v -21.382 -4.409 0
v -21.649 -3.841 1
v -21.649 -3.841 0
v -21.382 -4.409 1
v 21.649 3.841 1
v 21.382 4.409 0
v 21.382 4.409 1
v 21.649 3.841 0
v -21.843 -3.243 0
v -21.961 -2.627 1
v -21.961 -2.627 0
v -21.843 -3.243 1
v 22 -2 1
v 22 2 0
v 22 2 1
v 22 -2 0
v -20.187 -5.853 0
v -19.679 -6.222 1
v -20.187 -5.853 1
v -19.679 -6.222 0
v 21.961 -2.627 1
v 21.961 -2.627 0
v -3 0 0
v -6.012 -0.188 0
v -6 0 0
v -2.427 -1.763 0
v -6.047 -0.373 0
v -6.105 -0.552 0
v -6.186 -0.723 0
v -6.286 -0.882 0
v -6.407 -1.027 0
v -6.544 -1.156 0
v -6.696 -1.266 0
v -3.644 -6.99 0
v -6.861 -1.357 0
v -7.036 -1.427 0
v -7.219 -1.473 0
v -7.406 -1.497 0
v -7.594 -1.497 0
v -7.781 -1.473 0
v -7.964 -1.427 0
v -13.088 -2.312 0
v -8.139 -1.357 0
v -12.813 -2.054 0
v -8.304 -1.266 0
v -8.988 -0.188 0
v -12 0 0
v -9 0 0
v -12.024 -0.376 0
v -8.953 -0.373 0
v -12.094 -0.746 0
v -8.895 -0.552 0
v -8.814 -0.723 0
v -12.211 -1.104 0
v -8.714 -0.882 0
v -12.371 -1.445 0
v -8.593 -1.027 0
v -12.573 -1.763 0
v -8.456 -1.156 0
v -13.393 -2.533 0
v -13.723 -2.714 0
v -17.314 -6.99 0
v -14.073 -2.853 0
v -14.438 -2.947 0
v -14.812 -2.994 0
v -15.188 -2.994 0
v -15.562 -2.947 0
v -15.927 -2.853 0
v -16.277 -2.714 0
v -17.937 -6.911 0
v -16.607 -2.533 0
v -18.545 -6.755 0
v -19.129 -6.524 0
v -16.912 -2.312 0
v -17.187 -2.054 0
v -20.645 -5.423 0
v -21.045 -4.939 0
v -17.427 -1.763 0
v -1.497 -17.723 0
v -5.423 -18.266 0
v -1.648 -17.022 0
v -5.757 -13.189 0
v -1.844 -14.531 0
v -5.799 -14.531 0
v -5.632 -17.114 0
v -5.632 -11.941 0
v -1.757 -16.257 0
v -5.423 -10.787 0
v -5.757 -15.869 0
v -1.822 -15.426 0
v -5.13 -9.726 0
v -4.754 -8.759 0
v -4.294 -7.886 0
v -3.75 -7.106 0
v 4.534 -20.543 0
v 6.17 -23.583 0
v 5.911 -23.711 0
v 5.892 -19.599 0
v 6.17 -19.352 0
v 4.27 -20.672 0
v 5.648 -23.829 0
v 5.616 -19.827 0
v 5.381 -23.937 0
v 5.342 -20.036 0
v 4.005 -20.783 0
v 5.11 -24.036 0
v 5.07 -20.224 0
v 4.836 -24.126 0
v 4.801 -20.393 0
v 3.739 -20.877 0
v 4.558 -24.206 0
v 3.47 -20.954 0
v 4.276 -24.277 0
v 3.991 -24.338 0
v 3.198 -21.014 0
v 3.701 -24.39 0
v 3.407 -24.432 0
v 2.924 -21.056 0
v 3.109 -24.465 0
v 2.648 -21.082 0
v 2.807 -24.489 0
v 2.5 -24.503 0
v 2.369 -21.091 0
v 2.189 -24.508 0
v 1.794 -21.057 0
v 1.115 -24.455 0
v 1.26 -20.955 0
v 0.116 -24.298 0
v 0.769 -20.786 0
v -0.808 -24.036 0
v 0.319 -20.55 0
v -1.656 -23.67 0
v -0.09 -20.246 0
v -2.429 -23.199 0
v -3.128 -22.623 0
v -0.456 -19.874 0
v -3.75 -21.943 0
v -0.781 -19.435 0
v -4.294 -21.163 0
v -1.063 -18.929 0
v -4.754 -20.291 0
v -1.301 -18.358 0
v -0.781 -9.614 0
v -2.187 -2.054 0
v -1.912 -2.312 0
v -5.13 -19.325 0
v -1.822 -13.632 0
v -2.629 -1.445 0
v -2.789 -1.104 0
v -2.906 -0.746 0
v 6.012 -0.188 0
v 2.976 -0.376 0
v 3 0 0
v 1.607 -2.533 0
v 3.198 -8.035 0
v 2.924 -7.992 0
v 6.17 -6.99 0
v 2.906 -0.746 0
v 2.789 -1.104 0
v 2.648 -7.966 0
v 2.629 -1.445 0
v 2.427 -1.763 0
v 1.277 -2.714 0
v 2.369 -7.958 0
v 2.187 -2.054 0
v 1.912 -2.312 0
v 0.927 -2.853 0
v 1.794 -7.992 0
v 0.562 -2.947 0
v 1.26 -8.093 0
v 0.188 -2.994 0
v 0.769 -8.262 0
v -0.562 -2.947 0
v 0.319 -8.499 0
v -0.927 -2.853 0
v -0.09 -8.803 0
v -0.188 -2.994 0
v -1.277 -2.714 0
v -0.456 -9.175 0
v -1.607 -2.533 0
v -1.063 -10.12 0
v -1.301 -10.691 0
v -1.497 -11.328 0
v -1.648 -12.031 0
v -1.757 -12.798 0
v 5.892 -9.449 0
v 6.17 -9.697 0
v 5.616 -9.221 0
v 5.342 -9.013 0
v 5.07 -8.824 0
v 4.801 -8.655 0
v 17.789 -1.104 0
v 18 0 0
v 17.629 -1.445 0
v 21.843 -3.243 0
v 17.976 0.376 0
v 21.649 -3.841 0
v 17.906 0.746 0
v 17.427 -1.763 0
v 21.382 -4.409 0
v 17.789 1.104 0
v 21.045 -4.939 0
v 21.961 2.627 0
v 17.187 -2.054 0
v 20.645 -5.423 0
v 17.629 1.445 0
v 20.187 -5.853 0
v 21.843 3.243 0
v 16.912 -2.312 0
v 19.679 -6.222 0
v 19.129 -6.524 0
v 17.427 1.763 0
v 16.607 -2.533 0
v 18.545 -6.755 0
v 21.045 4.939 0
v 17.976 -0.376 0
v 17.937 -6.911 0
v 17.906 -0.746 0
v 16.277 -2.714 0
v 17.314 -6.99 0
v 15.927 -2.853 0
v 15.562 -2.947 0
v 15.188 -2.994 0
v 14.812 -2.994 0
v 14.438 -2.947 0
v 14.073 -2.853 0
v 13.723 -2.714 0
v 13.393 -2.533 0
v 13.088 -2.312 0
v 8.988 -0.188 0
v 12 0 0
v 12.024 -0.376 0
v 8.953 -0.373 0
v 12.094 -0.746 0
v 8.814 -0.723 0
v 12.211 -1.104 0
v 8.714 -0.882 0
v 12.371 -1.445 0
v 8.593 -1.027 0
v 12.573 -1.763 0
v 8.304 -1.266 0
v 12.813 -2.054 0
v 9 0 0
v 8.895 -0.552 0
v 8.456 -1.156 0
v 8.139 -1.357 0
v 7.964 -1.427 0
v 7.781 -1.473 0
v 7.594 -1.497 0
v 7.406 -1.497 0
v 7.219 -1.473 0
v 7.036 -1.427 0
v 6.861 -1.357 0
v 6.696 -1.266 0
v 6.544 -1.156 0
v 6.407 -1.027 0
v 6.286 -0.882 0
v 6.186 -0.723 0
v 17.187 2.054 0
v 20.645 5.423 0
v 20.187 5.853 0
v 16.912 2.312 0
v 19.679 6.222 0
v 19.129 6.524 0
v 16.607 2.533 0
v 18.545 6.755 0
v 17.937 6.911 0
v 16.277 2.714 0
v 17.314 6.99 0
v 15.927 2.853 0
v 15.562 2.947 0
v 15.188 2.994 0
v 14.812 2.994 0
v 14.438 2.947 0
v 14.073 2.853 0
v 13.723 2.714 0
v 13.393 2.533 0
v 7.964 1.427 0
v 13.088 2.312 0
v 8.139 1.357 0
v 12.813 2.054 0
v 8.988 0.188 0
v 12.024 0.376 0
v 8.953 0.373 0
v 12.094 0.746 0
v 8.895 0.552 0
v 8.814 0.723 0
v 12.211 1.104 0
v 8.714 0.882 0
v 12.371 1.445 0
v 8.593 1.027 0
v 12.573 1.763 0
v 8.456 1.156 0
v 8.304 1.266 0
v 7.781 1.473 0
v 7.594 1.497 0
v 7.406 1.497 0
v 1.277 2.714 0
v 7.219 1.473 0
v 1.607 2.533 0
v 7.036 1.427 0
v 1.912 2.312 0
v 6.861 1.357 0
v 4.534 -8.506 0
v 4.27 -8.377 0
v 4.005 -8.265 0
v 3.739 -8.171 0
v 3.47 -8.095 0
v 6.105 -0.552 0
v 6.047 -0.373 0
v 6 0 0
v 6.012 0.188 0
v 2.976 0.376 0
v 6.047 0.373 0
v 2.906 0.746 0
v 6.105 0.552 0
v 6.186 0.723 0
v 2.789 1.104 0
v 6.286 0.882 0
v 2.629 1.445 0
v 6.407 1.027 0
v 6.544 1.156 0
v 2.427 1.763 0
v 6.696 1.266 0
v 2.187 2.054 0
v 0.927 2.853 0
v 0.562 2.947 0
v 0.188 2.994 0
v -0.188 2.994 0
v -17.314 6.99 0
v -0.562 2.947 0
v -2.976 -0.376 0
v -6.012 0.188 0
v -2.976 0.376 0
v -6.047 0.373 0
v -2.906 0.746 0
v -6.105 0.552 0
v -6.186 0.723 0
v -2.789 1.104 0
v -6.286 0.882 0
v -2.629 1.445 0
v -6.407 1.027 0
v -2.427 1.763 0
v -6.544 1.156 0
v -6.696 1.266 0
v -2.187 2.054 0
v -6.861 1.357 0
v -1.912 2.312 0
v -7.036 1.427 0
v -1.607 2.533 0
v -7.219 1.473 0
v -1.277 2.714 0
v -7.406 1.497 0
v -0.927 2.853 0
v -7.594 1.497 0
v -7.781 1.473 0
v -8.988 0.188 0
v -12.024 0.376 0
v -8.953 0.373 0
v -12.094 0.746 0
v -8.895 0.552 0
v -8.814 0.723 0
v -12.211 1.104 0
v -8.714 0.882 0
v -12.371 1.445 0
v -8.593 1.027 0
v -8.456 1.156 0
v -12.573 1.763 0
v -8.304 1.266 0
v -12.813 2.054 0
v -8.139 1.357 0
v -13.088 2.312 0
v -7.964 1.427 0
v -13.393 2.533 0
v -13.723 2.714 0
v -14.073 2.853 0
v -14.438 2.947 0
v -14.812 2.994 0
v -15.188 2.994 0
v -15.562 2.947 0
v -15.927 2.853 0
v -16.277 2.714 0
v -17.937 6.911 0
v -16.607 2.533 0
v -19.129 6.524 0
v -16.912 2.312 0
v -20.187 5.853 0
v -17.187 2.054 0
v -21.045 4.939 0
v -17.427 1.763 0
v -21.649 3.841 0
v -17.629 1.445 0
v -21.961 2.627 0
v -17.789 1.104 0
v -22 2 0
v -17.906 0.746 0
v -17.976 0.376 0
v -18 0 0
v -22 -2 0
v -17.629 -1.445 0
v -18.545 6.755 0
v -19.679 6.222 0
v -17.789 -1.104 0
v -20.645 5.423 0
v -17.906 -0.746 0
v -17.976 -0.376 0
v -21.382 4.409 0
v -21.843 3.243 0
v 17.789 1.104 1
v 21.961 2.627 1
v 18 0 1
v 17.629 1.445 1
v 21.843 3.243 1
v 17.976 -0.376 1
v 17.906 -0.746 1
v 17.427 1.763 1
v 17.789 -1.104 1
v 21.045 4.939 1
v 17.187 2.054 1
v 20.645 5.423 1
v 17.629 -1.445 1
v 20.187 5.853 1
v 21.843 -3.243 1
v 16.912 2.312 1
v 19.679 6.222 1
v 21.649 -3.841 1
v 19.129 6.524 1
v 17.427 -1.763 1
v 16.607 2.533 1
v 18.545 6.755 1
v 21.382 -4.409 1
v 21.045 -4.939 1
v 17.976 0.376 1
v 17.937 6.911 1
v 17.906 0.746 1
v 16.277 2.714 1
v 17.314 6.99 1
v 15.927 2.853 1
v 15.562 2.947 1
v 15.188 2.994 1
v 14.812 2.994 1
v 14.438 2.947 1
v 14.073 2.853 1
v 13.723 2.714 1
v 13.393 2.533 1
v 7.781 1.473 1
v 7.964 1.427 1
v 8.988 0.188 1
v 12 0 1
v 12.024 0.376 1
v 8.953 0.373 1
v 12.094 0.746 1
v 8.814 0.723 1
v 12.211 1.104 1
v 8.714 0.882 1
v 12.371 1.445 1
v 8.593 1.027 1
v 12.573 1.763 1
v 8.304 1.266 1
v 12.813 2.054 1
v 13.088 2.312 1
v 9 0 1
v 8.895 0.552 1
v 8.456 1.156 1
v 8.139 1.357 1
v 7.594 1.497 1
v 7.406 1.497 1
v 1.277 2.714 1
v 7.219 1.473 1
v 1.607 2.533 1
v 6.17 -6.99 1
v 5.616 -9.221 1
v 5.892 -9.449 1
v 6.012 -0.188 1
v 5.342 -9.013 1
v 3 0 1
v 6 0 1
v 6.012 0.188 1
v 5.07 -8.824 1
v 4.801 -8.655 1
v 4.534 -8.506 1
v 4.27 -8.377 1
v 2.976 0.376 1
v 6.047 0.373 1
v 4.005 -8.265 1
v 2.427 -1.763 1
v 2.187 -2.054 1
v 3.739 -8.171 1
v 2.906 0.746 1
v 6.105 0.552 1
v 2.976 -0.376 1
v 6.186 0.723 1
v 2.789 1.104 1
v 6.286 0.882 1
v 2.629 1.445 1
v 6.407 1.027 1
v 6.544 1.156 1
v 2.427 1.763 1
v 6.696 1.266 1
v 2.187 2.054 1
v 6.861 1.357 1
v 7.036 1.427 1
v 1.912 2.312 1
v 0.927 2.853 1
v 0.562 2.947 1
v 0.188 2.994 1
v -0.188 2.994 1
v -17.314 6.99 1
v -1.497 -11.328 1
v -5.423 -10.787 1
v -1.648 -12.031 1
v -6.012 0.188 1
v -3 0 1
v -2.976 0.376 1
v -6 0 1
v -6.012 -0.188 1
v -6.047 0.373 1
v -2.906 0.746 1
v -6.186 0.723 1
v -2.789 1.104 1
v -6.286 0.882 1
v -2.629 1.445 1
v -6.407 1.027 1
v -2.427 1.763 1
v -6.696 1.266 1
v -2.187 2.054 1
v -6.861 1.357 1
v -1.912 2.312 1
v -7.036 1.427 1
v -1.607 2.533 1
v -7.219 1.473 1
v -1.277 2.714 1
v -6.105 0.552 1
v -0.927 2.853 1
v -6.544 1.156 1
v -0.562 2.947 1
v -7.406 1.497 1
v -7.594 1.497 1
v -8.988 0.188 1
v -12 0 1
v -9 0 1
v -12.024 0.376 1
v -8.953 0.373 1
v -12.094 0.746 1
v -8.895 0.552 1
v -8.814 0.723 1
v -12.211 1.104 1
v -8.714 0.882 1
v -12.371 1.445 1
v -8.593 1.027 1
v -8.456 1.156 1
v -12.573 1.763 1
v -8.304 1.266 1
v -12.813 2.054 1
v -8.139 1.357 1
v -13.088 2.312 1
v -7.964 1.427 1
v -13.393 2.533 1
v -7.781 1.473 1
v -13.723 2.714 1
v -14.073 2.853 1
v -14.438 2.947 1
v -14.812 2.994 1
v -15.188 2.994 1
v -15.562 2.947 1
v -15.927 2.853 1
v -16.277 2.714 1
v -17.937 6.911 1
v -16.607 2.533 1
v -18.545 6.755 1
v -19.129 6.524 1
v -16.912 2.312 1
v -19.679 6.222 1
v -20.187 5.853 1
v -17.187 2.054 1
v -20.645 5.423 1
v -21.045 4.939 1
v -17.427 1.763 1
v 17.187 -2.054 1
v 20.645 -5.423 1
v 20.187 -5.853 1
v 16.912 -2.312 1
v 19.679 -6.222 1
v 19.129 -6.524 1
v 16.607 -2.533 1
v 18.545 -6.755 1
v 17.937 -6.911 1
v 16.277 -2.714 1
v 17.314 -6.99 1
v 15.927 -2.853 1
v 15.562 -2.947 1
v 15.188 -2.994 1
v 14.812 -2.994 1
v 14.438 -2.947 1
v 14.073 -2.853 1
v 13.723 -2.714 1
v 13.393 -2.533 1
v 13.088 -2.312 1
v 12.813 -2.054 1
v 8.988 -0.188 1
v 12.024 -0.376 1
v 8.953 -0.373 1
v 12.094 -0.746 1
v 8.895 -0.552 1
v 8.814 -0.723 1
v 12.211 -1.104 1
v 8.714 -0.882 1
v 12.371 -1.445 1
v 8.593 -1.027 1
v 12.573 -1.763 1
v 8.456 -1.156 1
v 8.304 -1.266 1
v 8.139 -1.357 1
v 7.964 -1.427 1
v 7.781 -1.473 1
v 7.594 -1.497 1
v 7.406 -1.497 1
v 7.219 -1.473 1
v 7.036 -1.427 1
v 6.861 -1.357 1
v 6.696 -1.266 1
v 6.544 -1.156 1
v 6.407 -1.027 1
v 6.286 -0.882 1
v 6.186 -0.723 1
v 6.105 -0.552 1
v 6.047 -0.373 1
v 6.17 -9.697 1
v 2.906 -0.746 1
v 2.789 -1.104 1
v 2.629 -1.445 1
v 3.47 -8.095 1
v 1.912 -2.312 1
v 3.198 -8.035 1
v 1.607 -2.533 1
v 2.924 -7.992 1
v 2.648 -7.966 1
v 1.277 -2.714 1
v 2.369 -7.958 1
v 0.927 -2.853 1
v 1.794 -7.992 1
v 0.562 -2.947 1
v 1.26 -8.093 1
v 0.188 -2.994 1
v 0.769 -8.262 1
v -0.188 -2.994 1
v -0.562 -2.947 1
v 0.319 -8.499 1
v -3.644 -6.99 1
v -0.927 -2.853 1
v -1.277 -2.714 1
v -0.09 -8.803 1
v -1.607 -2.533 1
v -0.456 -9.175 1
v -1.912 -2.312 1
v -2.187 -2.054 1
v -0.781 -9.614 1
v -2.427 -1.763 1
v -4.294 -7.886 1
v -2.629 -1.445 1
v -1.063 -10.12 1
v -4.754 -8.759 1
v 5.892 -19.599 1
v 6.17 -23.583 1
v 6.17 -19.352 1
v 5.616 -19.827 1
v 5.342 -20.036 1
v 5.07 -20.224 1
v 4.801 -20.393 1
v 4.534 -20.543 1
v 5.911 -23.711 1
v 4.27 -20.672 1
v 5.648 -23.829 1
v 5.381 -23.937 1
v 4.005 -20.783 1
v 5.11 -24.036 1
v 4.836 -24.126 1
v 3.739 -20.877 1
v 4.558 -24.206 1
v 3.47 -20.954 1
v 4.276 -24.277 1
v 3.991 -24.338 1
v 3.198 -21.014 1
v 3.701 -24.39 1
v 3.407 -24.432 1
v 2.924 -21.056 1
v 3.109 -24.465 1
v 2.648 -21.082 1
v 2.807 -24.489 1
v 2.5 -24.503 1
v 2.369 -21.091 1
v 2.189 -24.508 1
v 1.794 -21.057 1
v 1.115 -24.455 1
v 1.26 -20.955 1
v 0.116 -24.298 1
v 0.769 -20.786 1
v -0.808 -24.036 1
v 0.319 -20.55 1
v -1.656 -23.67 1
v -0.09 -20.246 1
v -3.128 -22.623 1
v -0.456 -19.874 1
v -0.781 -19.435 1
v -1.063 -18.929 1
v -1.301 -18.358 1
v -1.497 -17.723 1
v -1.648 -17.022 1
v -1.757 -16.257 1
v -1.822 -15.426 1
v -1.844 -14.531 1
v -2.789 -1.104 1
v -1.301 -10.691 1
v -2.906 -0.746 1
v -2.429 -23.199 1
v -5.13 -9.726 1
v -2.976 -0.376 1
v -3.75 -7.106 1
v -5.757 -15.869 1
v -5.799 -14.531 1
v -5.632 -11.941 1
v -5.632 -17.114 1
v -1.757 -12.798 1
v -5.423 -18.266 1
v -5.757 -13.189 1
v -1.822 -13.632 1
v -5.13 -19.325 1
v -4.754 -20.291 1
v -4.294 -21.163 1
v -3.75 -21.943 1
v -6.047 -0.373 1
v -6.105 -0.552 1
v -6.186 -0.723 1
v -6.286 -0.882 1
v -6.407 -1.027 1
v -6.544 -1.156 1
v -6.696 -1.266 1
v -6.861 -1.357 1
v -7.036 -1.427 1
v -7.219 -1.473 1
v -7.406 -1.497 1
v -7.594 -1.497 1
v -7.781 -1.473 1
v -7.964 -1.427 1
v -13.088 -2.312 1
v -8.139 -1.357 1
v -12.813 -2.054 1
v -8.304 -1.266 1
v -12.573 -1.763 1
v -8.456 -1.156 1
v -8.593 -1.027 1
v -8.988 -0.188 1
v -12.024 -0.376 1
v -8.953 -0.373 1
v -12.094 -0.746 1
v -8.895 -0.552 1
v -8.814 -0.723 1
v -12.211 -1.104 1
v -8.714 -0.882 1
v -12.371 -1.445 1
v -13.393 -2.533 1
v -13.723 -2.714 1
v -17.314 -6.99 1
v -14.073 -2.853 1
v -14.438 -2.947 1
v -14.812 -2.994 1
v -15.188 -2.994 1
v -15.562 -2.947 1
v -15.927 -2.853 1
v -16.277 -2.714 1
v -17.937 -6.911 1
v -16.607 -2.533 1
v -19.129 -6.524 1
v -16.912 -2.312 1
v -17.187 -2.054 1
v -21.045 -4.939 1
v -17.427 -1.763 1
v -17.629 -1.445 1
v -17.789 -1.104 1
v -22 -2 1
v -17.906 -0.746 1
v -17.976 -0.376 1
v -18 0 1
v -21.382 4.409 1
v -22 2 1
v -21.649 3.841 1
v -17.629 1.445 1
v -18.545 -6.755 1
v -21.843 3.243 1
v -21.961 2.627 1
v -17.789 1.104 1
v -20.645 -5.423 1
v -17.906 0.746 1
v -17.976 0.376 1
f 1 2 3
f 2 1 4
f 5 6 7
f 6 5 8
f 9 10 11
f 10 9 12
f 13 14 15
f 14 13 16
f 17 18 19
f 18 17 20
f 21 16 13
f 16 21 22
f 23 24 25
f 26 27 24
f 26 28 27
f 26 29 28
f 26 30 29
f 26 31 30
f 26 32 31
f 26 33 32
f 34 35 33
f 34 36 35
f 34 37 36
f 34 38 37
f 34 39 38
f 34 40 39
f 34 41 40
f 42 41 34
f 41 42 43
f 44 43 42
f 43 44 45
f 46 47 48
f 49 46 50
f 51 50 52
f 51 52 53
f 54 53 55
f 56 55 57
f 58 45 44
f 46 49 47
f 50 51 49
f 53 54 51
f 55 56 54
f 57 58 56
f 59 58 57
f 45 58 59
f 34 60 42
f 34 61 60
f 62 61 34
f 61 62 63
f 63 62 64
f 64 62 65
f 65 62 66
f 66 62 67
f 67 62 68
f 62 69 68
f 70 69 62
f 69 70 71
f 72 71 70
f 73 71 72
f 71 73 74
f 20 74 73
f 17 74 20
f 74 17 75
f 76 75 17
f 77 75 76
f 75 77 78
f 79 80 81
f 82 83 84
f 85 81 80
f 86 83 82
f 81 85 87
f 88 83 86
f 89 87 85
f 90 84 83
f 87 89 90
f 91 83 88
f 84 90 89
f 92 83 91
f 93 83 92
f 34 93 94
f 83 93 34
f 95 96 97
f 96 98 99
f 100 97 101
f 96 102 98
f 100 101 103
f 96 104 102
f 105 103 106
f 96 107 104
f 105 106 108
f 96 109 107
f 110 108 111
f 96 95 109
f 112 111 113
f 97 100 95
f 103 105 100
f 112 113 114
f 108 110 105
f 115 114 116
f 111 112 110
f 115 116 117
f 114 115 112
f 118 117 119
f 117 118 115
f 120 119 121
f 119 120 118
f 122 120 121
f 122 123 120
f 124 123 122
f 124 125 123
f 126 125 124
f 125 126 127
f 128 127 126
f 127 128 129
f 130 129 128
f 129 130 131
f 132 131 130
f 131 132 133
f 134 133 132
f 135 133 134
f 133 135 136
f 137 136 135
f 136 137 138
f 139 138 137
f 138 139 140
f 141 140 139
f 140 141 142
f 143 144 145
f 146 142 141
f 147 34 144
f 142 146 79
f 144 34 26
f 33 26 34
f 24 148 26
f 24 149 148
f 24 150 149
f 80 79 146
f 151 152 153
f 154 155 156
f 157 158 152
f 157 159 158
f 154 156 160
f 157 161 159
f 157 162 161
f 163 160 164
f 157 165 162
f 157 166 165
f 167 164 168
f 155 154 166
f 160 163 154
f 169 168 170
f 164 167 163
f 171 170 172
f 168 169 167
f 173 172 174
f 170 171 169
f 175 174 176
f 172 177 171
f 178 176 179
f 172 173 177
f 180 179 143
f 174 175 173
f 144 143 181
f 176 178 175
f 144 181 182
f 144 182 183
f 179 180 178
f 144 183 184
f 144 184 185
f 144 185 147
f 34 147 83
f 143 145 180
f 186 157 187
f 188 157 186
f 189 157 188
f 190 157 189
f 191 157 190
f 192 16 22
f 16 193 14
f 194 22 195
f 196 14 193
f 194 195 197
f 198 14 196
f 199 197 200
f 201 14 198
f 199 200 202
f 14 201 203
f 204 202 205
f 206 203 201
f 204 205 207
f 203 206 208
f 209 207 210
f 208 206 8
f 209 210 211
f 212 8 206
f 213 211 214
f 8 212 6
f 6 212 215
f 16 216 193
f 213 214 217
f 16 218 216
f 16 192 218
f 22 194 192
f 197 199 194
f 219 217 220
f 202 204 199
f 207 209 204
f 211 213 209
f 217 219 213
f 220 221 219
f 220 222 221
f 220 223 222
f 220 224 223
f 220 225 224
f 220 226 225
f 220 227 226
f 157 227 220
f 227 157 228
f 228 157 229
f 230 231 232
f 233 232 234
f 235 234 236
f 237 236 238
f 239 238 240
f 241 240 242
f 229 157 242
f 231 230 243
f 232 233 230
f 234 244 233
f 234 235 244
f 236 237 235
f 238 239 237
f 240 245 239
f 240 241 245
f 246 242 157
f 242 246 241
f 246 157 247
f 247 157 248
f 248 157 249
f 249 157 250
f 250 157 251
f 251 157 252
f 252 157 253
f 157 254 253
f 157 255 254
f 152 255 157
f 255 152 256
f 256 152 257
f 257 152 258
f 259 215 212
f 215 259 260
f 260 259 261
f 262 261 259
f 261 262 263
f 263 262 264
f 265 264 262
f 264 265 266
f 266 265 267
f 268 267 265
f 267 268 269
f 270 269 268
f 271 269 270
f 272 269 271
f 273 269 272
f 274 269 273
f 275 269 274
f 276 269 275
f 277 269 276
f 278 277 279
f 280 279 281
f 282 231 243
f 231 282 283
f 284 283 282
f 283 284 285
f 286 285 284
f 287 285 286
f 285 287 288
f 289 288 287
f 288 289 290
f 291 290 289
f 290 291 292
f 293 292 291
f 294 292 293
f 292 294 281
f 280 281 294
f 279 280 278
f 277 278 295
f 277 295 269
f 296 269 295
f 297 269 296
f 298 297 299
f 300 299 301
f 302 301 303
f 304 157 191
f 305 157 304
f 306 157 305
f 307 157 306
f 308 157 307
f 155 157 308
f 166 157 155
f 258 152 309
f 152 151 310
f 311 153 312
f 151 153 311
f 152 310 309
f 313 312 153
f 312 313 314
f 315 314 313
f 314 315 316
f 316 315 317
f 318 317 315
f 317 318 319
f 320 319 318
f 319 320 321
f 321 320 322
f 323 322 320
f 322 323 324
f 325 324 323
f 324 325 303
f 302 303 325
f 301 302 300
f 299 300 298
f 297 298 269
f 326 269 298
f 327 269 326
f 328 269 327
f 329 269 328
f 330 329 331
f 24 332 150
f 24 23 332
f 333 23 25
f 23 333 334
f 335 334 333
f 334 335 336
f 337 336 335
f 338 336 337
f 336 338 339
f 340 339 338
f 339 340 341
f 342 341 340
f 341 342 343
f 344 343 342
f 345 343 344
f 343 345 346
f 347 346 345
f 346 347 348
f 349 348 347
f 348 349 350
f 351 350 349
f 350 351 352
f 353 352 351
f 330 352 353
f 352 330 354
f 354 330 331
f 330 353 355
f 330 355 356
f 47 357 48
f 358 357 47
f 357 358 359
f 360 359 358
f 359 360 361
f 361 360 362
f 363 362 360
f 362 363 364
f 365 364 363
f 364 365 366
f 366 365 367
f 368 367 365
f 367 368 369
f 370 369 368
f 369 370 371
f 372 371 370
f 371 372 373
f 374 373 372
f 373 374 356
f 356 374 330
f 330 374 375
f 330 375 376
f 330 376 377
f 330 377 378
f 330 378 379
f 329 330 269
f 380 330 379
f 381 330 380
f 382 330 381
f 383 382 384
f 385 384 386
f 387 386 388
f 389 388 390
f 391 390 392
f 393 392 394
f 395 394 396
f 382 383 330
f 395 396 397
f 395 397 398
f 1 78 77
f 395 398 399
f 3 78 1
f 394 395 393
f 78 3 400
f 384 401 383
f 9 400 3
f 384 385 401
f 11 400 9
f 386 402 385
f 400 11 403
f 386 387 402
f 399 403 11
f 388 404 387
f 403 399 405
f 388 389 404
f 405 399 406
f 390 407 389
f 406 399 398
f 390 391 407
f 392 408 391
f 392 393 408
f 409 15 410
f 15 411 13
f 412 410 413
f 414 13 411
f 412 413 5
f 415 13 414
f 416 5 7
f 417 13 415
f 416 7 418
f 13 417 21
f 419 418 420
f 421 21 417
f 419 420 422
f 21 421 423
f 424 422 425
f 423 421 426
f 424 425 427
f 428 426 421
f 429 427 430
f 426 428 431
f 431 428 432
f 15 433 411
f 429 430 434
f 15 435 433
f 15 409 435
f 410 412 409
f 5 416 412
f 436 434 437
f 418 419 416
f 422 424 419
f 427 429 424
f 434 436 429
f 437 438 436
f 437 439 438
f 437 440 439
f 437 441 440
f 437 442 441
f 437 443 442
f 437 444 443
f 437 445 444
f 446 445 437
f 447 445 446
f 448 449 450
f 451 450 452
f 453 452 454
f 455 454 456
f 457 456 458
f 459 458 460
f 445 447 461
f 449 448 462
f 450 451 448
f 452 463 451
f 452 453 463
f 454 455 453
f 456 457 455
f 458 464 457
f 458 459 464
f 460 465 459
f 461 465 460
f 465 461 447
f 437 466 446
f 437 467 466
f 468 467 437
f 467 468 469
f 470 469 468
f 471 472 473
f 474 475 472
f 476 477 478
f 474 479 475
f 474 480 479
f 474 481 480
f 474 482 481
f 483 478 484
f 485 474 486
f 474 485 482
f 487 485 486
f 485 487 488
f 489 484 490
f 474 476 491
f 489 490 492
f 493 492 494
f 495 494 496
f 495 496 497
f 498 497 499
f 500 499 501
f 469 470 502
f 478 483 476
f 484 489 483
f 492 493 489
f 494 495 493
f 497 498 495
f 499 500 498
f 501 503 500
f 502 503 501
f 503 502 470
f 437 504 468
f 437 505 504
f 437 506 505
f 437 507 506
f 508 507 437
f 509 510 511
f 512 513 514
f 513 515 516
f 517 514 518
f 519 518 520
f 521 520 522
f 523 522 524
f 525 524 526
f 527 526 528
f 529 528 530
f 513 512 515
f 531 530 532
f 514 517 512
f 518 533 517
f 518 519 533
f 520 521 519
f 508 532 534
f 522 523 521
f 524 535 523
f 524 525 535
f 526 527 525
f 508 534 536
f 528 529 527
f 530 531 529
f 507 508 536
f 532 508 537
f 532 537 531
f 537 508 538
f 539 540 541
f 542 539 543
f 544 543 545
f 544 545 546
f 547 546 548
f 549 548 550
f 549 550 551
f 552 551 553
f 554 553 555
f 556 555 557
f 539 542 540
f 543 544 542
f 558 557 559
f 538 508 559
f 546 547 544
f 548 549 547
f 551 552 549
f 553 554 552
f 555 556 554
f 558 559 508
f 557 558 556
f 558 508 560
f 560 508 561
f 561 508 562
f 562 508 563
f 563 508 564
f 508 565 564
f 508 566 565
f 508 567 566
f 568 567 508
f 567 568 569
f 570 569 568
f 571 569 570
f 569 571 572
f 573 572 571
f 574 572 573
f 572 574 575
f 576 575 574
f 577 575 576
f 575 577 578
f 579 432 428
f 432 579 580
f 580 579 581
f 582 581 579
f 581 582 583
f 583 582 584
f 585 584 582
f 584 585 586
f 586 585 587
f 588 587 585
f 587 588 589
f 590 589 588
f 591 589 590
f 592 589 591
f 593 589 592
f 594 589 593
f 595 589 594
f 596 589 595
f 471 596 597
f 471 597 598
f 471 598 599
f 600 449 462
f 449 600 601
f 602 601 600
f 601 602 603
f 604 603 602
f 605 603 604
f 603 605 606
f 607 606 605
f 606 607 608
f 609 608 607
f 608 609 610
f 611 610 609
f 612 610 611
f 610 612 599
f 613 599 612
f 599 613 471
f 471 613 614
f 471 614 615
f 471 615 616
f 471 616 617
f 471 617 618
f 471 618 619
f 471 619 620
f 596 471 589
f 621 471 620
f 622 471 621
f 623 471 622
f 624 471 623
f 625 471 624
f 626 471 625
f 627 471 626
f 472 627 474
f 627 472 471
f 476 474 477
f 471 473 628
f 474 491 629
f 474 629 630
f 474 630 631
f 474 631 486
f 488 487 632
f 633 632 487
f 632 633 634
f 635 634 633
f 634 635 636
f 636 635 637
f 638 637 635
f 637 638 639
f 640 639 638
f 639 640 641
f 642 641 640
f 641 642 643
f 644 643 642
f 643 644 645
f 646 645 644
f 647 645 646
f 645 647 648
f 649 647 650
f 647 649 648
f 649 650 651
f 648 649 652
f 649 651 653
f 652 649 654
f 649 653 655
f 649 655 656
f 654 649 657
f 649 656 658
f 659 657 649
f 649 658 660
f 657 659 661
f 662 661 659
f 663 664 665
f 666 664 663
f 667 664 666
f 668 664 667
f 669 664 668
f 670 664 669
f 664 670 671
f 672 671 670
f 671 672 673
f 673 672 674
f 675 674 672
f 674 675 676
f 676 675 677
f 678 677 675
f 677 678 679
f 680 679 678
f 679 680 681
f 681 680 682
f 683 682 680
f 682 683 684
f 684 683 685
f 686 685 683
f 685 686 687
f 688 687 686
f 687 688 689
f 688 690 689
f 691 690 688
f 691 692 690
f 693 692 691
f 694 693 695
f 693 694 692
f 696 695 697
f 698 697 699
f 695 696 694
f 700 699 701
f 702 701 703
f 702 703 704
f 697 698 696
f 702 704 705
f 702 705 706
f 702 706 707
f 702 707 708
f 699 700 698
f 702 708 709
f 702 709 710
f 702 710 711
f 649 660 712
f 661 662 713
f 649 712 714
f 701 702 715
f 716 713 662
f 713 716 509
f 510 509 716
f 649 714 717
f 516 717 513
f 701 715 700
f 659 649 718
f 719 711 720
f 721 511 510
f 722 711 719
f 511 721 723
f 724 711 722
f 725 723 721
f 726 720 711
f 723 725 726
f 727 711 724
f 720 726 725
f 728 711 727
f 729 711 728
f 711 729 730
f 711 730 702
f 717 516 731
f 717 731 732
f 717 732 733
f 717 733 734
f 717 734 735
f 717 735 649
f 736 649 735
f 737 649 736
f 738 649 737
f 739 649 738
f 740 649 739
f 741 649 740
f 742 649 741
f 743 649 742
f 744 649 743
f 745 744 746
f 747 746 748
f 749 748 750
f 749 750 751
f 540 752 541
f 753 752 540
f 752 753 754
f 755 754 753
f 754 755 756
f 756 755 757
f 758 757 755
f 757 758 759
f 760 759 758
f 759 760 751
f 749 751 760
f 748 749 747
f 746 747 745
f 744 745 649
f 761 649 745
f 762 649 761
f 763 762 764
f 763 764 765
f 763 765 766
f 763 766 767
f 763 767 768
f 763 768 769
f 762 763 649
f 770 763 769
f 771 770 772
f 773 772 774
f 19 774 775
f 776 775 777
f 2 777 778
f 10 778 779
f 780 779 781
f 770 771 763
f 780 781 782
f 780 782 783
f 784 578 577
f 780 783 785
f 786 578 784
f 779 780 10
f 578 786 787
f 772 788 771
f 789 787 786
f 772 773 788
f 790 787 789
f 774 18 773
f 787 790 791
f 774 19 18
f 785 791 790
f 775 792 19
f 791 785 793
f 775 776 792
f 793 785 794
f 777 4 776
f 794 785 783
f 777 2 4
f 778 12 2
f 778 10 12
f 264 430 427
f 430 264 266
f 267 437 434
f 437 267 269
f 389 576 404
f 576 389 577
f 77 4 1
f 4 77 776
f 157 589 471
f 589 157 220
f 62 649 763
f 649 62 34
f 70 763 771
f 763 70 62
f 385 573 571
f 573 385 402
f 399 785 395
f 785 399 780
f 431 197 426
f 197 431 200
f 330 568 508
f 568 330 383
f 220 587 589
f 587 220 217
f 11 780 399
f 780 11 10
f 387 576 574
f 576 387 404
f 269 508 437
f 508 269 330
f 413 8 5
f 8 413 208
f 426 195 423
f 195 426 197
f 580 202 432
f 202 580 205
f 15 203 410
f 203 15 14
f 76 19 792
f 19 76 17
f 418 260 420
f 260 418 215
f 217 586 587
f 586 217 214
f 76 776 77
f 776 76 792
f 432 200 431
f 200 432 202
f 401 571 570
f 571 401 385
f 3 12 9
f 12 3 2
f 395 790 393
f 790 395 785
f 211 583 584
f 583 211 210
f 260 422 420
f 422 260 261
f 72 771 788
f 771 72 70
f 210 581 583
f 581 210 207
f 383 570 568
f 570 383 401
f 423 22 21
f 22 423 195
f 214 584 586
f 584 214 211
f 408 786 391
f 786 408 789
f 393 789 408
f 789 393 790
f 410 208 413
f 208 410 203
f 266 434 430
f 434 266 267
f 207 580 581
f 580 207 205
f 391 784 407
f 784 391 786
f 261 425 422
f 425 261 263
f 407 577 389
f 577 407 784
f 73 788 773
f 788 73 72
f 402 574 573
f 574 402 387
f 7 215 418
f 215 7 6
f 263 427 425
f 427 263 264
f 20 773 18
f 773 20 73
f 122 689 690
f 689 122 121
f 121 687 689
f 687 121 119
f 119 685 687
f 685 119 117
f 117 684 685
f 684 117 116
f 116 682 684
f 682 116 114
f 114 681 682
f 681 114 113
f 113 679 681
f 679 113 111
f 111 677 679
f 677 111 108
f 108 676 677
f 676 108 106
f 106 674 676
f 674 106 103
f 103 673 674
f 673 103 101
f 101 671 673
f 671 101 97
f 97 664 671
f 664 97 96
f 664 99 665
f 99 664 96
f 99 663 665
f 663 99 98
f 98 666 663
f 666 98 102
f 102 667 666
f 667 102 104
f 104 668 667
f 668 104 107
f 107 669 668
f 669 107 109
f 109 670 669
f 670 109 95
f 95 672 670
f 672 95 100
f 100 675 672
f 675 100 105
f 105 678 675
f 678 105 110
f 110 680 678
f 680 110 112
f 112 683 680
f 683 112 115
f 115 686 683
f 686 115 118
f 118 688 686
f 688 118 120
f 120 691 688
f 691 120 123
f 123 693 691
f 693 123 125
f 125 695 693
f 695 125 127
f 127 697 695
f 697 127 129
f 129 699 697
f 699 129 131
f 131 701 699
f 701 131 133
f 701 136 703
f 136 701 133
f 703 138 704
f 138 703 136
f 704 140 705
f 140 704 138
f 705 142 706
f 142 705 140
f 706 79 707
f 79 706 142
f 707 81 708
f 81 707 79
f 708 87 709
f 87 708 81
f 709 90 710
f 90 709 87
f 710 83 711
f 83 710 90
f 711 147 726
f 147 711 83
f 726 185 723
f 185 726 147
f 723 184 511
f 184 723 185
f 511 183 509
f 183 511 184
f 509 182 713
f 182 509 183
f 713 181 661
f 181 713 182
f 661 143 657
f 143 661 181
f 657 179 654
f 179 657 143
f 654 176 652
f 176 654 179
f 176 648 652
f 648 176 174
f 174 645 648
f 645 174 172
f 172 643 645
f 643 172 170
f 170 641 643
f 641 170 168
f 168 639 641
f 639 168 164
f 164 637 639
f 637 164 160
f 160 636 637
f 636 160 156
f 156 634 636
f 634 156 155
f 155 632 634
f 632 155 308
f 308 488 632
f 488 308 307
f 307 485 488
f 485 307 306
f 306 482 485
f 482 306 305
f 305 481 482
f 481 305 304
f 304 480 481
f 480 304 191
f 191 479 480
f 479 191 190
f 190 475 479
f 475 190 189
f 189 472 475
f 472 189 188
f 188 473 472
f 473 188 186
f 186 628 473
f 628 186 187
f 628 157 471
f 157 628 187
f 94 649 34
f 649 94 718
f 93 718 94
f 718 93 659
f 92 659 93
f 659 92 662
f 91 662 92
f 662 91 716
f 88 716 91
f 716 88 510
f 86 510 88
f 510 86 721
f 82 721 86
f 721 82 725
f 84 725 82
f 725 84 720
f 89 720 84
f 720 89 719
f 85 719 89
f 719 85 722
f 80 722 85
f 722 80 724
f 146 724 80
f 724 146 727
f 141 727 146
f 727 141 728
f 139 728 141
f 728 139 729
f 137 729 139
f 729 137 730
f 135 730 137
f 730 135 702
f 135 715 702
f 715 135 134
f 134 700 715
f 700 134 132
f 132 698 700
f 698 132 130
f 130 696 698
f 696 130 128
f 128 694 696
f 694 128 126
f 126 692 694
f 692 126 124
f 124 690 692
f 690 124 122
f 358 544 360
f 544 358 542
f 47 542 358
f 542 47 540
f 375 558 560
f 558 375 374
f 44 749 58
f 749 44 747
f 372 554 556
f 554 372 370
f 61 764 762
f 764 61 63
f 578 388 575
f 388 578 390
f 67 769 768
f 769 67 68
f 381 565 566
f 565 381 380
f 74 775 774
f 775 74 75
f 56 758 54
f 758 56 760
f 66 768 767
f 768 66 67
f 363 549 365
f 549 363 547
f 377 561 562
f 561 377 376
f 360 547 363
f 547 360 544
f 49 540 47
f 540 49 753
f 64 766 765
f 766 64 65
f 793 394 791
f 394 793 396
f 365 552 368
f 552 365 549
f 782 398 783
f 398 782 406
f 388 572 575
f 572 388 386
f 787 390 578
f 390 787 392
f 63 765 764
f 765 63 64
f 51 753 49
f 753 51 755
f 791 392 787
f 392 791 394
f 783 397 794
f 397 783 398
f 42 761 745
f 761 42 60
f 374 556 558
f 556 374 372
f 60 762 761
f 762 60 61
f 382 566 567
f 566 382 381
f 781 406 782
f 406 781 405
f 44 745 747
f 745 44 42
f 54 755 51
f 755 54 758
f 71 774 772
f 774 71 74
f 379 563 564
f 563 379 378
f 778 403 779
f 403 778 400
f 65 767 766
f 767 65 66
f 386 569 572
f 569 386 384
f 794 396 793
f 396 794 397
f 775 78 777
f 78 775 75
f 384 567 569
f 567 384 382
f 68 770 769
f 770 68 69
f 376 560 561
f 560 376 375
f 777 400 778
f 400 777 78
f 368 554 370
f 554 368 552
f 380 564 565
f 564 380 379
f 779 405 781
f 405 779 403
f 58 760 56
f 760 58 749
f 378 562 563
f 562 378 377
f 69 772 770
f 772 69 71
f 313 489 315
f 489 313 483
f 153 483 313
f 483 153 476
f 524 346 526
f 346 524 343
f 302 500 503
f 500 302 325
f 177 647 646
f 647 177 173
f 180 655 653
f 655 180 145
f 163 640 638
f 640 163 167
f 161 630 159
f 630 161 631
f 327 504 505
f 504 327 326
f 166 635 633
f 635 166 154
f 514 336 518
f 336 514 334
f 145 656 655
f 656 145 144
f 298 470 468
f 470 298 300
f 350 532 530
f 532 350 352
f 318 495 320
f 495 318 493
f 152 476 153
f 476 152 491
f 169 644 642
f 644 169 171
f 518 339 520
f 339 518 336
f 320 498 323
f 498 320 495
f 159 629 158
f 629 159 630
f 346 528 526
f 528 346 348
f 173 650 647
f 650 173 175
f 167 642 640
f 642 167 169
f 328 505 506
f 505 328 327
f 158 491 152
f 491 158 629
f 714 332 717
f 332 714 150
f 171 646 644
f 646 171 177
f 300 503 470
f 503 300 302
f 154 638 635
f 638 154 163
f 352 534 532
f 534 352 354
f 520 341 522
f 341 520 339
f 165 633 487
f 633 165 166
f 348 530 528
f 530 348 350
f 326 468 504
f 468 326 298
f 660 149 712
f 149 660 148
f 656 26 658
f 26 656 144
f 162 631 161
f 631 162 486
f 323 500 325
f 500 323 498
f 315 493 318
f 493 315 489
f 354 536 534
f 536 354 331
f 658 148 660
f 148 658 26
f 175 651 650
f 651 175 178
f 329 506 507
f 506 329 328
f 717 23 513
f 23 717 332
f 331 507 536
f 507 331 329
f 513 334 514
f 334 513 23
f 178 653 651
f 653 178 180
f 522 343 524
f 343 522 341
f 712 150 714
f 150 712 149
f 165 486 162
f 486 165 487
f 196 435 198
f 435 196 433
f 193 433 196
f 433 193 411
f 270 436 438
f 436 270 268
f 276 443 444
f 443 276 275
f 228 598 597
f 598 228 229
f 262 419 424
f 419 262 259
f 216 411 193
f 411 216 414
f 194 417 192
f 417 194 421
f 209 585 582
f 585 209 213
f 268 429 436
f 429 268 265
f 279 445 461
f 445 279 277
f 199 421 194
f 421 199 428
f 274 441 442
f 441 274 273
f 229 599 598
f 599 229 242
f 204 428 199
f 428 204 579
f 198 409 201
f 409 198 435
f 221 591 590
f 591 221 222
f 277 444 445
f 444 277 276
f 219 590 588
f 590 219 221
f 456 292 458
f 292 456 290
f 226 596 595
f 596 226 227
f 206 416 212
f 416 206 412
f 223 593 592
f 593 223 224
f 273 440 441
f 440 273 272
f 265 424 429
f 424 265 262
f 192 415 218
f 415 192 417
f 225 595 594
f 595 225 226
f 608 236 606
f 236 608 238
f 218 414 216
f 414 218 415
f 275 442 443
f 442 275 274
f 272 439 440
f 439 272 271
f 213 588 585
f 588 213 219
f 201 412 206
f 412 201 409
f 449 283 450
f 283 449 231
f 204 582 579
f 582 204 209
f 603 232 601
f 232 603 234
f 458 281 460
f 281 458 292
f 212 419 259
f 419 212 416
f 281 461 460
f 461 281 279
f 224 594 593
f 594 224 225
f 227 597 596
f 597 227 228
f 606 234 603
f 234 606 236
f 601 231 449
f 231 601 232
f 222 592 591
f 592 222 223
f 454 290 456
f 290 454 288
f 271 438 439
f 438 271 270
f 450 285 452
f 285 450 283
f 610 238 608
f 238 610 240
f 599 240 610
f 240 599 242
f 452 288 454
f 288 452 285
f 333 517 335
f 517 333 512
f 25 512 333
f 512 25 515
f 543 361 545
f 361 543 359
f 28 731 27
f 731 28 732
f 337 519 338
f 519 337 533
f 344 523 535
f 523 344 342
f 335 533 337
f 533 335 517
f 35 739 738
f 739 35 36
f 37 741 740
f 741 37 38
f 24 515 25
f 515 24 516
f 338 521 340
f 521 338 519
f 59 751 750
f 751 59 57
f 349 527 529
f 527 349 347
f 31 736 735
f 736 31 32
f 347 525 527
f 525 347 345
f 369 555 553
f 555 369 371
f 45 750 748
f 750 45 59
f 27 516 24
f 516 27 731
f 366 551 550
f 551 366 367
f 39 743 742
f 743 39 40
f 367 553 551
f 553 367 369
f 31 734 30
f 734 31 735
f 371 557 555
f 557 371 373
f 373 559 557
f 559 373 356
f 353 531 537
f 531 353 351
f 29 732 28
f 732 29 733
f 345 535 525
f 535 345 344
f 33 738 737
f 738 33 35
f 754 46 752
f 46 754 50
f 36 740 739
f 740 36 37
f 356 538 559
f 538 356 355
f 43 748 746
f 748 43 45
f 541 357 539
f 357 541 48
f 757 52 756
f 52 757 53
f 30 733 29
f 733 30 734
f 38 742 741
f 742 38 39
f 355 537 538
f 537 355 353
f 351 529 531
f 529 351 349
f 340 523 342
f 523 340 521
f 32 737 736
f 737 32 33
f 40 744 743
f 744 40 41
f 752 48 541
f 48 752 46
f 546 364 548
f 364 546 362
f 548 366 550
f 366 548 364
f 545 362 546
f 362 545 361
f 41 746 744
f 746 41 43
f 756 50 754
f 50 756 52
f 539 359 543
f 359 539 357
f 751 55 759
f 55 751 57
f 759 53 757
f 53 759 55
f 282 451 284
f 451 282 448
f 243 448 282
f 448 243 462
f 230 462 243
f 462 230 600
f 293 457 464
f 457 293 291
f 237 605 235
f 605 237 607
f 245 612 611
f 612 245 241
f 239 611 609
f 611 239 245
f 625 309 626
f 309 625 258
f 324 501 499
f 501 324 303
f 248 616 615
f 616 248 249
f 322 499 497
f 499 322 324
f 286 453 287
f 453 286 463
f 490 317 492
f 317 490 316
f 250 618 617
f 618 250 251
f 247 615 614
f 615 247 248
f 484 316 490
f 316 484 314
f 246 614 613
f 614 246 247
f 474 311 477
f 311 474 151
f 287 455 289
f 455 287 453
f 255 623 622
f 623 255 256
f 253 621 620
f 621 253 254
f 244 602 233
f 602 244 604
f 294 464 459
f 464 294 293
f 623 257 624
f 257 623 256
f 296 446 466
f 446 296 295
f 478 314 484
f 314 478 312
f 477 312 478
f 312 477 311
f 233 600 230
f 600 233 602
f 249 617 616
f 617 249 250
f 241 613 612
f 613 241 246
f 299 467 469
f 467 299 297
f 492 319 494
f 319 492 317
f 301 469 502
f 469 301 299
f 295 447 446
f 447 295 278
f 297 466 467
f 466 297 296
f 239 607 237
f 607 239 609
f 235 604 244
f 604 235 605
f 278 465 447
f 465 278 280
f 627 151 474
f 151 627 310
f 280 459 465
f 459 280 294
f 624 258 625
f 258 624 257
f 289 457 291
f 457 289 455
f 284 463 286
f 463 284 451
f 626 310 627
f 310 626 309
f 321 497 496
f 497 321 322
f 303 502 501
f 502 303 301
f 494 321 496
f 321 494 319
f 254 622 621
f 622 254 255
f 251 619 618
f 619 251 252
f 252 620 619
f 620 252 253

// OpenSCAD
$fn = 50;


difference() {
	union() {
		hull() {
			translate(v = [-17.0000000000, 2.0000000000, 0]) {
				cylinder(h = 1, r = 5);
			}
			translate(v = [17.0000000000, 2.0000000000, 0]) {
				cylinder(h = 1, r = 5);
			}
			translate(v = [-17.0000000000, -2.0000000000, 0]) {
				cylinder(h = 1, r = 5);
			}
			translate(v = [17.0000000000, -2.0000000000, 0]) {
				cylinder(h = 1, r = 5);
			}
		}
		translate(v = [0, -5, 0]) {
			linear_extrude(height = 1) {
				text(font = "DejaVu Sans Mono:style=Bold", halign = "center", size = 19.0000000000, text = "C", valign = "top");
			}
		}
	}
	union() {
		translate(v = [-15.0000000000, 0.0000000000, 0]) {
			translate(v = [0, 0, -100]) {
				cylinder(h = 200, r = 3.0000000000);
			}
		}
		translate(v = [0, 0, -100]) {
			cylinder(h = 200, r = 3.0000000000);
		}
		translate(v = [15.0000000000, 0.0000000000, 0]) {
			translate(v = [0, 0, -100]) {
				cylinder(h = 200, r = 3.0000000000);
			}
		}
		translate(v = [-15.0000000000, 0.0000000000, 0]) {
			translate(v = [0, 0, -100]) {
				cylinder(h = 200, r = 1.5000000000);
			}
		}
		translate(v = [-7.5000000000, 0.0000000000, 0]) {
			translate(v = [0, 0, -100]) {
				cylinder(h = 200, r = 1.5000000000);
			}
		}
		translate(v = [0, 0, -100]) {
			cylinder(h = 200, r = 1.5000000000);
		}
		translate(v = [7.5000000000, 0.0000000000, 0]) {
			translate(v = [0, 0, -100]) {
				cylinder(h = 200, r = 1.5000000000);
			}
		}
		translate(v = [15.0000000000, 0.0000000000, 0]) {
			translate(v = [0, 0, -100]) {
				cylinder(h = 200, r = 1.5000000000);
			}
		}
	}
}
